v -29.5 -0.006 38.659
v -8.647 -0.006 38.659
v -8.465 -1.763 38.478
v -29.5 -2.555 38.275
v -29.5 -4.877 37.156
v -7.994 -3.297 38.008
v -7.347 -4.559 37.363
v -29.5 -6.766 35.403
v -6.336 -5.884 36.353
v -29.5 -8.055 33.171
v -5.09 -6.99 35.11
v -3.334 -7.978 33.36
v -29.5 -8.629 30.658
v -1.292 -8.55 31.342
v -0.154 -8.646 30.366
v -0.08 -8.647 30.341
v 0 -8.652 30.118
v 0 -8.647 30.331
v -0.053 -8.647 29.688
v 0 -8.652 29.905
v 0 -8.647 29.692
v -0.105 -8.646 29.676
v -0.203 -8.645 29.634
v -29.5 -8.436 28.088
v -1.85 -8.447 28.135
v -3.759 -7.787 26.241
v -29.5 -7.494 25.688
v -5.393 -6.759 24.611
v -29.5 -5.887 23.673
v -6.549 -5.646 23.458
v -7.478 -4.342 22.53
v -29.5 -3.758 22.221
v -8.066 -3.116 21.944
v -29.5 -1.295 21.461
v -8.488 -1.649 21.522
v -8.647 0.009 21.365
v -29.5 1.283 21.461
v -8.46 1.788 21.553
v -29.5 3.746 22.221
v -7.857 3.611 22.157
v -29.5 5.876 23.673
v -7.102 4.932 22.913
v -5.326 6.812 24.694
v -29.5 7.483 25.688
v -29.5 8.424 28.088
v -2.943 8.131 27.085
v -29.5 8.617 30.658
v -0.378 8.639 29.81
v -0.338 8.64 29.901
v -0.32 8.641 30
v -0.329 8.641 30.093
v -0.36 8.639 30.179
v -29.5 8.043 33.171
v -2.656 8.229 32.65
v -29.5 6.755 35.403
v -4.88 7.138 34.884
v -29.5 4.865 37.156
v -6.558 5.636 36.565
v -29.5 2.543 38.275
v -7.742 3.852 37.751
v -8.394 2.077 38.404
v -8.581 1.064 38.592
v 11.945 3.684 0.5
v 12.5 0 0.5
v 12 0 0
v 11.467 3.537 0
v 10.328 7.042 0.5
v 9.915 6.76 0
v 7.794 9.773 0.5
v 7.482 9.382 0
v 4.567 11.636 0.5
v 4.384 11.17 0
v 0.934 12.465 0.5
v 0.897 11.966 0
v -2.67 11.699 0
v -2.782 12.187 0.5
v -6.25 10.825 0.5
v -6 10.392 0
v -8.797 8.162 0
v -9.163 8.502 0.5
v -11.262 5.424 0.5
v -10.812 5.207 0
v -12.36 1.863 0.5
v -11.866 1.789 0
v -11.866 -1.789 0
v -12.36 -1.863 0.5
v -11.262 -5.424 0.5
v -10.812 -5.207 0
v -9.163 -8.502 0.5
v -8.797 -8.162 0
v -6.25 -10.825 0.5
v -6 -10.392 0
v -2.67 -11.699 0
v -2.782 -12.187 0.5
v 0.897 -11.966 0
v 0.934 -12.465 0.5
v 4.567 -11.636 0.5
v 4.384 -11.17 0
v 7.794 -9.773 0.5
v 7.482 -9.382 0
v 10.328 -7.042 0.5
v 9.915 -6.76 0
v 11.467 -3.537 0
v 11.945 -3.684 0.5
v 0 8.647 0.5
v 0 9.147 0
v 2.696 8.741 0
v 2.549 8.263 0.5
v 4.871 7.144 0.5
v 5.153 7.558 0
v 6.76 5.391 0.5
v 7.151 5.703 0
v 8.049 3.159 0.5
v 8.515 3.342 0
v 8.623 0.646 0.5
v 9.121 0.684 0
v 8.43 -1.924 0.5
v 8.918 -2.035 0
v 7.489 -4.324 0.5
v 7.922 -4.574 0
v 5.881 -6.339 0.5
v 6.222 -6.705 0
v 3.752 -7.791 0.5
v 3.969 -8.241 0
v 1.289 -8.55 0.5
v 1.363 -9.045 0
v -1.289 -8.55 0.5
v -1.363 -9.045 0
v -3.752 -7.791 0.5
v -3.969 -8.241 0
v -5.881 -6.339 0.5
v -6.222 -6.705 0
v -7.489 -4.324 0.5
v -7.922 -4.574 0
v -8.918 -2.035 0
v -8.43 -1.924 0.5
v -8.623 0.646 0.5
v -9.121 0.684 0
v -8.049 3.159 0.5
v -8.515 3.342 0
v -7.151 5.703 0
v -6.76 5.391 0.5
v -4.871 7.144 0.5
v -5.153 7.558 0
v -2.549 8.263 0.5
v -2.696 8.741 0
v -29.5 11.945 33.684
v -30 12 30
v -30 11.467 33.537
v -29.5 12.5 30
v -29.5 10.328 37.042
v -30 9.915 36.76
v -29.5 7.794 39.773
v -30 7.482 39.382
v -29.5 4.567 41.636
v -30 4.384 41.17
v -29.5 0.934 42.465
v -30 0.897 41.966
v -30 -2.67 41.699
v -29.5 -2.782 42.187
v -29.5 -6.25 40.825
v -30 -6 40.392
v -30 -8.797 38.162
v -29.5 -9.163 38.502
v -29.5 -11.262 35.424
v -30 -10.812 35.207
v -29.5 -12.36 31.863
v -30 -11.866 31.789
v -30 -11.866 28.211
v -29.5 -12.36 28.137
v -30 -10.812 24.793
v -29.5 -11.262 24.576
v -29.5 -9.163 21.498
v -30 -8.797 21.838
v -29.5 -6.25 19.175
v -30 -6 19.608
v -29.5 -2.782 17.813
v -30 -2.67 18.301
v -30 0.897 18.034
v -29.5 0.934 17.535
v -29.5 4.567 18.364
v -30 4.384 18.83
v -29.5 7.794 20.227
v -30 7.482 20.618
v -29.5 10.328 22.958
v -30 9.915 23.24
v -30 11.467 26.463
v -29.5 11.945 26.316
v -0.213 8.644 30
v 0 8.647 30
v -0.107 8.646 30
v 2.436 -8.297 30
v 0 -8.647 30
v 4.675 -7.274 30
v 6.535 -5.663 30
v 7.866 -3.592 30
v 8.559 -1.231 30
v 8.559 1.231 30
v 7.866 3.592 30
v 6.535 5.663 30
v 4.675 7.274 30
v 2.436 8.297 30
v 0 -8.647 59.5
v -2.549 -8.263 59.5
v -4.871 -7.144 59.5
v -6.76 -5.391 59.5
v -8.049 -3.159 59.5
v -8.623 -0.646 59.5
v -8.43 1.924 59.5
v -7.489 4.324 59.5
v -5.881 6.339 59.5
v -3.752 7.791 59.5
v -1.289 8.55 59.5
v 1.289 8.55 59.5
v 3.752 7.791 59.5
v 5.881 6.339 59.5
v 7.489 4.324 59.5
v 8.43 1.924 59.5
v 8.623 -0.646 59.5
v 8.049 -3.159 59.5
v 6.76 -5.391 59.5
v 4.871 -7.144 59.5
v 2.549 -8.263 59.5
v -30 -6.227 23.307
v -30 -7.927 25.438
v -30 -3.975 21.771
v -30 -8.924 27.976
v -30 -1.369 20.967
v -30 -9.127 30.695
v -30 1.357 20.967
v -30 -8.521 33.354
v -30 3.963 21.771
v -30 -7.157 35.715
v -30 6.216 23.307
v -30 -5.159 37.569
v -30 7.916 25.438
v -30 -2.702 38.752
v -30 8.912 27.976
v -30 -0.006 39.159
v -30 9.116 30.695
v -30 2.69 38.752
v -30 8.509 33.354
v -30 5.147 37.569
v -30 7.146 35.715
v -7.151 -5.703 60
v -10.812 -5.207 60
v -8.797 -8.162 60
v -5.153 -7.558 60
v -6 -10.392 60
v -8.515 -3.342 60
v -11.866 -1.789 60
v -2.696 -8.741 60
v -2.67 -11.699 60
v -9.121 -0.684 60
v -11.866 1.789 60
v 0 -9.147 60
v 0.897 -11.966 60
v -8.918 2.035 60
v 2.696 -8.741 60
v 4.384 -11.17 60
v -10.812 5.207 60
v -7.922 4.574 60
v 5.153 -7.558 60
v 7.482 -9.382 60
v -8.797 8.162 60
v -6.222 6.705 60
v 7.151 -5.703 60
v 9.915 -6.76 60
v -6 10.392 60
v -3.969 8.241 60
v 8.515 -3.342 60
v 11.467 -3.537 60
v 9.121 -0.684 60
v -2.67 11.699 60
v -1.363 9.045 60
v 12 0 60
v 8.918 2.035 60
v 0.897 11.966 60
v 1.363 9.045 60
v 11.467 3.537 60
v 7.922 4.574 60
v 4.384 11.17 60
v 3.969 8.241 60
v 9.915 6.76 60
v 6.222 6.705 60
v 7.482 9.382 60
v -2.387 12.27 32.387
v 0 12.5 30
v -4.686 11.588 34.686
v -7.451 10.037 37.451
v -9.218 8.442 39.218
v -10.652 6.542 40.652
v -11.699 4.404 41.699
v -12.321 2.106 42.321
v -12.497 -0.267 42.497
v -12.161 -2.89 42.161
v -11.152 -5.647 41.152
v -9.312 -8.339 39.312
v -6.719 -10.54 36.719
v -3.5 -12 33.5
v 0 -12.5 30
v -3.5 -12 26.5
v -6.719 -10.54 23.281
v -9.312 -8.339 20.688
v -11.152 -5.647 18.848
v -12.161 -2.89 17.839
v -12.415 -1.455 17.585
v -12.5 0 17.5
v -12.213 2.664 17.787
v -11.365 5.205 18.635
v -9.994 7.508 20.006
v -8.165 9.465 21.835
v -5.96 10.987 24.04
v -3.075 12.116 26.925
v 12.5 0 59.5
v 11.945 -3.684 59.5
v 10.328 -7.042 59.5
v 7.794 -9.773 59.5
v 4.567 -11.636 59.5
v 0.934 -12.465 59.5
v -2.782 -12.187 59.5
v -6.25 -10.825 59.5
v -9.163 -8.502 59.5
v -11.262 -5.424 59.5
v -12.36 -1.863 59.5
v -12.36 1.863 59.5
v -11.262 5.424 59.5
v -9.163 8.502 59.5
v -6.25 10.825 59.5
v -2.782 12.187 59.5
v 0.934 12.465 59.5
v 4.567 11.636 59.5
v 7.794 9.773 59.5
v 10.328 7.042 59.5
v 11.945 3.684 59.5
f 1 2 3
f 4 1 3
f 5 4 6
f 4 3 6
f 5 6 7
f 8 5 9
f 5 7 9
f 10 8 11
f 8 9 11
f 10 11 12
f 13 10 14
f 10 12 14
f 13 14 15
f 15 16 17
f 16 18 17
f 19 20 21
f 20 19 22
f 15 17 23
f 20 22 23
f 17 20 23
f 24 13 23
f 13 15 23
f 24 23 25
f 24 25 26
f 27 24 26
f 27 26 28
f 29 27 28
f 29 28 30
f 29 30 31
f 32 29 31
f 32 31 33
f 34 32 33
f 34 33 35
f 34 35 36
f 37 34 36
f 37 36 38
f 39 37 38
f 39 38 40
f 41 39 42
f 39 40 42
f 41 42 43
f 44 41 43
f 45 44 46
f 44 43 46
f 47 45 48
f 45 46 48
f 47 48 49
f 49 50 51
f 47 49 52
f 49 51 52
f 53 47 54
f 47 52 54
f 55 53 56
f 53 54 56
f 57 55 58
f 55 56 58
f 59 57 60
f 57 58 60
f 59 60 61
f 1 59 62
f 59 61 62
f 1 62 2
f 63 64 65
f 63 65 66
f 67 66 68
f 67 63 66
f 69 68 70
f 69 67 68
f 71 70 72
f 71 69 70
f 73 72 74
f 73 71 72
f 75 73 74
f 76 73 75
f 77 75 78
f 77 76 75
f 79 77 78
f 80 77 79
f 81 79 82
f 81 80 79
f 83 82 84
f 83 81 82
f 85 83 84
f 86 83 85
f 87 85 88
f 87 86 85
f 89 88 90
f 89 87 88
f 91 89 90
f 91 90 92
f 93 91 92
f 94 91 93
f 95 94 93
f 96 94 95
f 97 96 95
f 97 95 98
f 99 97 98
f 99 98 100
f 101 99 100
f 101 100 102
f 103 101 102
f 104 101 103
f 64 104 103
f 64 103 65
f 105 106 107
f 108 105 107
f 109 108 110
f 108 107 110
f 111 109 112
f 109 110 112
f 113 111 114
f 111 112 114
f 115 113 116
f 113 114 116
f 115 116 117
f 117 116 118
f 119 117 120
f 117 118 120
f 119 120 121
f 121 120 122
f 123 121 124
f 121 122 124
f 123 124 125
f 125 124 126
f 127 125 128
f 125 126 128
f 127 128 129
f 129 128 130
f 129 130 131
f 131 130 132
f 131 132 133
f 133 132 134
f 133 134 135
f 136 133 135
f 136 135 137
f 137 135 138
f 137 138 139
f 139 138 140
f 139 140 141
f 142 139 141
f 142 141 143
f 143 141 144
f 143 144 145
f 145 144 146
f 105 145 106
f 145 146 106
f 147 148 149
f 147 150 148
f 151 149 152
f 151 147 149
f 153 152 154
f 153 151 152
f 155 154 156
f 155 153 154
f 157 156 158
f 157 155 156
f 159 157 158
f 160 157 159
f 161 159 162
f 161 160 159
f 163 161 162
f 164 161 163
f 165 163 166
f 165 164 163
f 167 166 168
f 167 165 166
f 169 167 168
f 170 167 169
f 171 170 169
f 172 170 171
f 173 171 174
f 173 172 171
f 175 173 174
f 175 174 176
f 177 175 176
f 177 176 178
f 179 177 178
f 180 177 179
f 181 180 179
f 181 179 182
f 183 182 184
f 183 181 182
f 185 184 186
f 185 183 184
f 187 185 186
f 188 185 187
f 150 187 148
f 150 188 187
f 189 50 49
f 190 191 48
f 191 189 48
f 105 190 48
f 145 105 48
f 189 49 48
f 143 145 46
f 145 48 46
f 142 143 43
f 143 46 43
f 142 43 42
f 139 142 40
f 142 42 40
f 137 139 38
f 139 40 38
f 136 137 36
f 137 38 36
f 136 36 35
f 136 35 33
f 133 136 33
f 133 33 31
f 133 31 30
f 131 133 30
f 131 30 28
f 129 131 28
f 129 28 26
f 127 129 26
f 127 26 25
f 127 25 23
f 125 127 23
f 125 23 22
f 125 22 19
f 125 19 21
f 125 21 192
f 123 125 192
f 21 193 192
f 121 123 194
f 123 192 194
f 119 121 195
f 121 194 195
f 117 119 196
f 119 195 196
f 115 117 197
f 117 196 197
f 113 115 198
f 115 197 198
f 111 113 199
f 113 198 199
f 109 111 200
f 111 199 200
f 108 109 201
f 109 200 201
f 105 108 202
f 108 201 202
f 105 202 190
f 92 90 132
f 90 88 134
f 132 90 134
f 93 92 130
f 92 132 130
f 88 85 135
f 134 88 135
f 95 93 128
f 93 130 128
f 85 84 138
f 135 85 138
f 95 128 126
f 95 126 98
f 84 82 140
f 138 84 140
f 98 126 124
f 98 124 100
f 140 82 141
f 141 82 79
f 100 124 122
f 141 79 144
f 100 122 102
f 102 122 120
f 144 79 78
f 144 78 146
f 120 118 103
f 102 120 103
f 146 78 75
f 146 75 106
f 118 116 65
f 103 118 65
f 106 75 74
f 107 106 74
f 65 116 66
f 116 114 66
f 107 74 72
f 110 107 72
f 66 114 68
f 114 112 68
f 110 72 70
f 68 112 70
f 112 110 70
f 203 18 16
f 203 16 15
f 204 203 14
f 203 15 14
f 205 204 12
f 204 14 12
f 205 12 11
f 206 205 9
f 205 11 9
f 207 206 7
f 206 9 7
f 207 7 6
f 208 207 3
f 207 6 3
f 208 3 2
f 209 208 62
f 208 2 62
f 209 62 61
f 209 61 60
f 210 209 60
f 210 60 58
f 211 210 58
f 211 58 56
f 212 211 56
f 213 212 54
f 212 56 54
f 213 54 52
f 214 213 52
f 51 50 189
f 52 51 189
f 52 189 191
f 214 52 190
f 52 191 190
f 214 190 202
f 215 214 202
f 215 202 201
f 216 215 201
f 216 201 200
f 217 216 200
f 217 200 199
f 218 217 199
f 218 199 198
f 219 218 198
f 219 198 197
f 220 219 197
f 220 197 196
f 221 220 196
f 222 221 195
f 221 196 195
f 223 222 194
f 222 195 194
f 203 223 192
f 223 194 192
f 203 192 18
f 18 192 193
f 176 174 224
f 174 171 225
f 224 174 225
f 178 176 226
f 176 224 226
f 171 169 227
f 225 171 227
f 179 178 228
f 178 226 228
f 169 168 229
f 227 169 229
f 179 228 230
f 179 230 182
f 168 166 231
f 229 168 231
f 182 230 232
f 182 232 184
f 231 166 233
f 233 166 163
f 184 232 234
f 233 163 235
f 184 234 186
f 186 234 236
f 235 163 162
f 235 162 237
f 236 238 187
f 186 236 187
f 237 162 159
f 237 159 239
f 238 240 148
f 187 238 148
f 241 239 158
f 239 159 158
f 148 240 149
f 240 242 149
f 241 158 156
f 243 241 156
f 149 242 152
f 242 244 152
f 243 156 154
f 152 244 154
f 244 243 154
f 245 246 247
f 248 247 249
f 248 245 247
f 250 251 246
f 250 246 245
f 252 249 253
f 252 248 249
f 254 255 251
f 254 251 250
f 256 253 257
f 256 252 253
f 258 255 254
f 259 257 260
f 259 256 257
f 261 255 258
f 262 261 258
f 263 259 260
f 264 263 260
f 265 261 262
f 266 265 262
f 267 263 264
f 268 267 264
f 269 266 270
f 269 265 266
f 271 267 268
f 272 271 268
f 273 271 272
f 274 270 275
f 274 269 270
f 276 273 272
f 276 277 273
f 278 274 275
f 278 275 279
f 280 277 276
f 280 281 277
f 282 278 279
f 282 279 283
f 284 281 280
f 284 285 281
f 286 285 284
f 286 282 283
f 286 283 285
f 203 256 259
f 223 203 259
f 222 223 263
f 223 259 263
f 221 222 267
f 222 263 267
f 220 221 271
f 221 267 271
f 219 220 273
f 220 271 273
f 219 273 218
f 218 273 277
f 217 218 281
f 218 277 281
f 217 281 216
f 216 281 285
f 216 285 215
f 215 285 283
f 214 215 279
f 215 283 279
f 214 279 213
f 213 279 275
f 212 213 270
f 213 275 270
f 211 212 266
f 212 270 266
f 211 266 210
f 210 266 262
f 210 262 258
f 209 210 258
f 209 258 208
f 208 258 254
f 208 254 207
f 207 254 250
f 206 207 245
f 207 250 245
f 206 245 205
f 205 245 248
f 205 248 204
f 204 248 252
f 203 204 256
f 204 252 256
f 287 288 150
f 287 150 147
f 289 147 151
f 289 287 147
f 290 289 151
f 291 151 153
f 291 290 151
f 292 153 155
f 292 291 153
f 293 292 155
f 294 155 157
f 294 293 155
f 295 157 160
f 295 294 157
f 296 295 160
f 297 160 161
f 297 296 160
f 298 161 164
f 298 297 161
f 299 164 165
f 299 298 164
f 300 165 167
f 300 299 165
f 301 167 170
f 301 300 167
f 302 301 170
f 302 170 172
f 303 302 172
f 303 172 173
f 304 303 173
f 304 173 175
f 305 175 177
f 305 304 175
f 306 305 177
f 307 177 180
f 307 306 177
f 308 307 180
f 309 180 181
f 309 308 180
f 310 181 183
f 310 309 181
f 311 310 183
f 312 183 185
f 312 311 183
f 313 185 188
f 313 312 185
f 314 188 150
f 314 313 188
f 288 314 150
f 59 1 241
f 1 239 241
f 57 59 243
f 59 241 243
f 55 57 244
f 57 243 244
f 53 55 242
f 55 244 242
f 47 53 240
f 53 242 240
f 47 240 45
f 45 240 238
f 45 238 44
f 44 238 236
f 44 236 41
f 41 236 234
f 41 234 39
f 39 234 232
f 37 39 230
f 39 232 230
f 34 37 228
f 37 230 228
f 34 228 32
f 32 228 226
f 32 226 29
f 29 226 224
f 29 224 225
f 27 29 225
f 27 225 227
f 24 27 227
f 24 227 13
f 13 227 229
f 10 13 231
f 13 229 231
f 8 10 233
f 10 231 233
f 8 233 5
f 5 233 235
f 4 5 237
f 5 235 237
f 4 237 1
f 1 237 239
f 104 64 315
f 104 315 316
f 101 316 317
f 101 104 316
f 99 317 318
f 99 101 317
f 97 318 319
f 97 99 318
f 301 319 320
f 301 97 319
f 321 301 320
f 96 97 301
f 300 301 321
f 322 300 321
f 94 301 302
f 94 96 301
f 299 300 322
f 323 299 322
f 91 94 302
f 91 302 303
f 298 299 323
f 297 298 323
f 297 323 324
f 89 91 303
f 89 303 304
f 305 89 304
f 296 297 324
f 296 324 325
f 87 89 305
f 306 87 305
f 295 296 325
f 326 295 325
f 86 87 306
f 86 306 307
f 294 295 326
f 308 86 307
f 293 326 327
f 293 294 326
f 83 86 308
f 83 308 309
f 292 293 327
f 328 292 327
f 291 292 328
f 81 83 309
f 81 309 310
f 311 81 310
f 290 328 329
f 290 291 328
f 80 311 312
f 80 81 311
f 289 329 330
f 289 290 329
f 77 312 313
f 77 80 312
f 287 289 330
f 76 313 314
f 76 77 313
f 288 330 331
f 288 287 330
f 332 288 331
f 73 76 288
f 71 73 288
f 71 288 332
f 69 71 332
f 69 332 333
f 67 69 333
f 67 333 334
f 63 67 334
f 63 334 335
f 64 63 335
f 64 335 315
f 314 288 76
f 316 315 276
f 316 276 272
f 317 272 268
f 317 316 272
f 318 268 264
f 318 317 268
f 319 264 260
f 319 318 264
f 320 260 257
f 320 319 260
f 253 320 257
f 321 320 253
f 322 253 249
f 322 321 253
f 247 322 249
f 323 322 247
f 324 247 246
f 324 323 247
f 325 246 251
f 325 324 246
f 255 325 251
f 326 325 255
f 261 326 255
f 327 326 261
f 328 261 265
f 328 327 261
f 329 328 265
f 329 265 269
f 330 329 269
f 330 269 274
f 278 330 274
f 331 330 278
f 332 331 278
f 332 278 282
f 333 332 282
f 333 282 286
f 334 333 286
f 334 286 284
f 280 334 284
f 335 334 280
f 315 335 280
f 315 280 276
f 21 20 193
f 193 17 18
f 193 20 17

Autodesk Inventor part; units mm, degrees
ref_plane "YZ Plane" through (0, 0, 0) normal (1, 0, 0) x (0, 1, 0)
ref_plane "XZ Plane" through (0, 0, 0) normal (0, 1, 0) x (-1, 0, 0)
ref_plane "XY Plane" through (0, 0, 0) normal (0, 0, 1) x (1, 0, 0)
sketch "Skizze1" plane through (0, 0, 0) normal (0, 0, 1) x (1, 0, 0)
  line L0 (-17.5, 0) -> (17.5, 0) projected
  line L1 (0, -17.5) -> (0, 17.5) projected
  circle A0 centre (0, 0) radius 12.5
  dimension "d0" = 25
extrude "Extrusion1" add sketch "Skizze1" along normal blind 60
sketch "Skizze2" plane through (0, 0, 60) normal (0, 0, 1) x (1, 0, 0)
  circle A0 centre (0, 0) radius 10.8915
sketch "Skizze3" plane through (0, 0, 0) normal (1, 0, 0) x (0, 1, 0)
  line L0 (12.5, 0) -> (-12.5, 0) projected
  circle A0 centre (0, 30) radius 12.5
  point P0 (0, 0)
  dimension "d3" = 30
  dimension "d4" = 25
extrude "Extrusion2" add sketch "Skizze3" against normal blind 30
sketch "Skizze4" plane through (0, 0, 0) normal (0, 0, -1) x (-1, 0, 0)
  point P0 (0, 0)
hole "Bohrung1" at (0, 0, 0) direction (0, 0, 1) diameter 17.294 depth 30 thread size "M20x2.5" class "6H" standard "ISO Metric profile"
hole "Bohrung2" at (0, 0, 60) direction (0, 0, -1) diameter 17.294 depth 30 thread size "M20x2.5" class "6H" standard "ISO Metric profile"
sketch "Skizze5" plane through (-30, 0, 30) normal (-1, 0, 0) x (0, 0, 1)
  point P0 (-30, 0)
  point P1 (0.0118, -0.0059)
hole "Bohrung3" at (-30, -0.0059, 30.0118) direction (1, 0, 0) diameter 17.294 depth 30 thread size "M20x2.5" class "6H" standard "ISO Metric profile"
chamfer "Fase1" distance 0.5 angle 45 6 edges at (-12.5, 0, 60) (0, 8.647, 60) (-30, -12.5, 30) (-30, -0.0059, 21.3648) (-12.5, 0, 0) (0, -8.647, 0)
properties part number "Verbindungsstück"
